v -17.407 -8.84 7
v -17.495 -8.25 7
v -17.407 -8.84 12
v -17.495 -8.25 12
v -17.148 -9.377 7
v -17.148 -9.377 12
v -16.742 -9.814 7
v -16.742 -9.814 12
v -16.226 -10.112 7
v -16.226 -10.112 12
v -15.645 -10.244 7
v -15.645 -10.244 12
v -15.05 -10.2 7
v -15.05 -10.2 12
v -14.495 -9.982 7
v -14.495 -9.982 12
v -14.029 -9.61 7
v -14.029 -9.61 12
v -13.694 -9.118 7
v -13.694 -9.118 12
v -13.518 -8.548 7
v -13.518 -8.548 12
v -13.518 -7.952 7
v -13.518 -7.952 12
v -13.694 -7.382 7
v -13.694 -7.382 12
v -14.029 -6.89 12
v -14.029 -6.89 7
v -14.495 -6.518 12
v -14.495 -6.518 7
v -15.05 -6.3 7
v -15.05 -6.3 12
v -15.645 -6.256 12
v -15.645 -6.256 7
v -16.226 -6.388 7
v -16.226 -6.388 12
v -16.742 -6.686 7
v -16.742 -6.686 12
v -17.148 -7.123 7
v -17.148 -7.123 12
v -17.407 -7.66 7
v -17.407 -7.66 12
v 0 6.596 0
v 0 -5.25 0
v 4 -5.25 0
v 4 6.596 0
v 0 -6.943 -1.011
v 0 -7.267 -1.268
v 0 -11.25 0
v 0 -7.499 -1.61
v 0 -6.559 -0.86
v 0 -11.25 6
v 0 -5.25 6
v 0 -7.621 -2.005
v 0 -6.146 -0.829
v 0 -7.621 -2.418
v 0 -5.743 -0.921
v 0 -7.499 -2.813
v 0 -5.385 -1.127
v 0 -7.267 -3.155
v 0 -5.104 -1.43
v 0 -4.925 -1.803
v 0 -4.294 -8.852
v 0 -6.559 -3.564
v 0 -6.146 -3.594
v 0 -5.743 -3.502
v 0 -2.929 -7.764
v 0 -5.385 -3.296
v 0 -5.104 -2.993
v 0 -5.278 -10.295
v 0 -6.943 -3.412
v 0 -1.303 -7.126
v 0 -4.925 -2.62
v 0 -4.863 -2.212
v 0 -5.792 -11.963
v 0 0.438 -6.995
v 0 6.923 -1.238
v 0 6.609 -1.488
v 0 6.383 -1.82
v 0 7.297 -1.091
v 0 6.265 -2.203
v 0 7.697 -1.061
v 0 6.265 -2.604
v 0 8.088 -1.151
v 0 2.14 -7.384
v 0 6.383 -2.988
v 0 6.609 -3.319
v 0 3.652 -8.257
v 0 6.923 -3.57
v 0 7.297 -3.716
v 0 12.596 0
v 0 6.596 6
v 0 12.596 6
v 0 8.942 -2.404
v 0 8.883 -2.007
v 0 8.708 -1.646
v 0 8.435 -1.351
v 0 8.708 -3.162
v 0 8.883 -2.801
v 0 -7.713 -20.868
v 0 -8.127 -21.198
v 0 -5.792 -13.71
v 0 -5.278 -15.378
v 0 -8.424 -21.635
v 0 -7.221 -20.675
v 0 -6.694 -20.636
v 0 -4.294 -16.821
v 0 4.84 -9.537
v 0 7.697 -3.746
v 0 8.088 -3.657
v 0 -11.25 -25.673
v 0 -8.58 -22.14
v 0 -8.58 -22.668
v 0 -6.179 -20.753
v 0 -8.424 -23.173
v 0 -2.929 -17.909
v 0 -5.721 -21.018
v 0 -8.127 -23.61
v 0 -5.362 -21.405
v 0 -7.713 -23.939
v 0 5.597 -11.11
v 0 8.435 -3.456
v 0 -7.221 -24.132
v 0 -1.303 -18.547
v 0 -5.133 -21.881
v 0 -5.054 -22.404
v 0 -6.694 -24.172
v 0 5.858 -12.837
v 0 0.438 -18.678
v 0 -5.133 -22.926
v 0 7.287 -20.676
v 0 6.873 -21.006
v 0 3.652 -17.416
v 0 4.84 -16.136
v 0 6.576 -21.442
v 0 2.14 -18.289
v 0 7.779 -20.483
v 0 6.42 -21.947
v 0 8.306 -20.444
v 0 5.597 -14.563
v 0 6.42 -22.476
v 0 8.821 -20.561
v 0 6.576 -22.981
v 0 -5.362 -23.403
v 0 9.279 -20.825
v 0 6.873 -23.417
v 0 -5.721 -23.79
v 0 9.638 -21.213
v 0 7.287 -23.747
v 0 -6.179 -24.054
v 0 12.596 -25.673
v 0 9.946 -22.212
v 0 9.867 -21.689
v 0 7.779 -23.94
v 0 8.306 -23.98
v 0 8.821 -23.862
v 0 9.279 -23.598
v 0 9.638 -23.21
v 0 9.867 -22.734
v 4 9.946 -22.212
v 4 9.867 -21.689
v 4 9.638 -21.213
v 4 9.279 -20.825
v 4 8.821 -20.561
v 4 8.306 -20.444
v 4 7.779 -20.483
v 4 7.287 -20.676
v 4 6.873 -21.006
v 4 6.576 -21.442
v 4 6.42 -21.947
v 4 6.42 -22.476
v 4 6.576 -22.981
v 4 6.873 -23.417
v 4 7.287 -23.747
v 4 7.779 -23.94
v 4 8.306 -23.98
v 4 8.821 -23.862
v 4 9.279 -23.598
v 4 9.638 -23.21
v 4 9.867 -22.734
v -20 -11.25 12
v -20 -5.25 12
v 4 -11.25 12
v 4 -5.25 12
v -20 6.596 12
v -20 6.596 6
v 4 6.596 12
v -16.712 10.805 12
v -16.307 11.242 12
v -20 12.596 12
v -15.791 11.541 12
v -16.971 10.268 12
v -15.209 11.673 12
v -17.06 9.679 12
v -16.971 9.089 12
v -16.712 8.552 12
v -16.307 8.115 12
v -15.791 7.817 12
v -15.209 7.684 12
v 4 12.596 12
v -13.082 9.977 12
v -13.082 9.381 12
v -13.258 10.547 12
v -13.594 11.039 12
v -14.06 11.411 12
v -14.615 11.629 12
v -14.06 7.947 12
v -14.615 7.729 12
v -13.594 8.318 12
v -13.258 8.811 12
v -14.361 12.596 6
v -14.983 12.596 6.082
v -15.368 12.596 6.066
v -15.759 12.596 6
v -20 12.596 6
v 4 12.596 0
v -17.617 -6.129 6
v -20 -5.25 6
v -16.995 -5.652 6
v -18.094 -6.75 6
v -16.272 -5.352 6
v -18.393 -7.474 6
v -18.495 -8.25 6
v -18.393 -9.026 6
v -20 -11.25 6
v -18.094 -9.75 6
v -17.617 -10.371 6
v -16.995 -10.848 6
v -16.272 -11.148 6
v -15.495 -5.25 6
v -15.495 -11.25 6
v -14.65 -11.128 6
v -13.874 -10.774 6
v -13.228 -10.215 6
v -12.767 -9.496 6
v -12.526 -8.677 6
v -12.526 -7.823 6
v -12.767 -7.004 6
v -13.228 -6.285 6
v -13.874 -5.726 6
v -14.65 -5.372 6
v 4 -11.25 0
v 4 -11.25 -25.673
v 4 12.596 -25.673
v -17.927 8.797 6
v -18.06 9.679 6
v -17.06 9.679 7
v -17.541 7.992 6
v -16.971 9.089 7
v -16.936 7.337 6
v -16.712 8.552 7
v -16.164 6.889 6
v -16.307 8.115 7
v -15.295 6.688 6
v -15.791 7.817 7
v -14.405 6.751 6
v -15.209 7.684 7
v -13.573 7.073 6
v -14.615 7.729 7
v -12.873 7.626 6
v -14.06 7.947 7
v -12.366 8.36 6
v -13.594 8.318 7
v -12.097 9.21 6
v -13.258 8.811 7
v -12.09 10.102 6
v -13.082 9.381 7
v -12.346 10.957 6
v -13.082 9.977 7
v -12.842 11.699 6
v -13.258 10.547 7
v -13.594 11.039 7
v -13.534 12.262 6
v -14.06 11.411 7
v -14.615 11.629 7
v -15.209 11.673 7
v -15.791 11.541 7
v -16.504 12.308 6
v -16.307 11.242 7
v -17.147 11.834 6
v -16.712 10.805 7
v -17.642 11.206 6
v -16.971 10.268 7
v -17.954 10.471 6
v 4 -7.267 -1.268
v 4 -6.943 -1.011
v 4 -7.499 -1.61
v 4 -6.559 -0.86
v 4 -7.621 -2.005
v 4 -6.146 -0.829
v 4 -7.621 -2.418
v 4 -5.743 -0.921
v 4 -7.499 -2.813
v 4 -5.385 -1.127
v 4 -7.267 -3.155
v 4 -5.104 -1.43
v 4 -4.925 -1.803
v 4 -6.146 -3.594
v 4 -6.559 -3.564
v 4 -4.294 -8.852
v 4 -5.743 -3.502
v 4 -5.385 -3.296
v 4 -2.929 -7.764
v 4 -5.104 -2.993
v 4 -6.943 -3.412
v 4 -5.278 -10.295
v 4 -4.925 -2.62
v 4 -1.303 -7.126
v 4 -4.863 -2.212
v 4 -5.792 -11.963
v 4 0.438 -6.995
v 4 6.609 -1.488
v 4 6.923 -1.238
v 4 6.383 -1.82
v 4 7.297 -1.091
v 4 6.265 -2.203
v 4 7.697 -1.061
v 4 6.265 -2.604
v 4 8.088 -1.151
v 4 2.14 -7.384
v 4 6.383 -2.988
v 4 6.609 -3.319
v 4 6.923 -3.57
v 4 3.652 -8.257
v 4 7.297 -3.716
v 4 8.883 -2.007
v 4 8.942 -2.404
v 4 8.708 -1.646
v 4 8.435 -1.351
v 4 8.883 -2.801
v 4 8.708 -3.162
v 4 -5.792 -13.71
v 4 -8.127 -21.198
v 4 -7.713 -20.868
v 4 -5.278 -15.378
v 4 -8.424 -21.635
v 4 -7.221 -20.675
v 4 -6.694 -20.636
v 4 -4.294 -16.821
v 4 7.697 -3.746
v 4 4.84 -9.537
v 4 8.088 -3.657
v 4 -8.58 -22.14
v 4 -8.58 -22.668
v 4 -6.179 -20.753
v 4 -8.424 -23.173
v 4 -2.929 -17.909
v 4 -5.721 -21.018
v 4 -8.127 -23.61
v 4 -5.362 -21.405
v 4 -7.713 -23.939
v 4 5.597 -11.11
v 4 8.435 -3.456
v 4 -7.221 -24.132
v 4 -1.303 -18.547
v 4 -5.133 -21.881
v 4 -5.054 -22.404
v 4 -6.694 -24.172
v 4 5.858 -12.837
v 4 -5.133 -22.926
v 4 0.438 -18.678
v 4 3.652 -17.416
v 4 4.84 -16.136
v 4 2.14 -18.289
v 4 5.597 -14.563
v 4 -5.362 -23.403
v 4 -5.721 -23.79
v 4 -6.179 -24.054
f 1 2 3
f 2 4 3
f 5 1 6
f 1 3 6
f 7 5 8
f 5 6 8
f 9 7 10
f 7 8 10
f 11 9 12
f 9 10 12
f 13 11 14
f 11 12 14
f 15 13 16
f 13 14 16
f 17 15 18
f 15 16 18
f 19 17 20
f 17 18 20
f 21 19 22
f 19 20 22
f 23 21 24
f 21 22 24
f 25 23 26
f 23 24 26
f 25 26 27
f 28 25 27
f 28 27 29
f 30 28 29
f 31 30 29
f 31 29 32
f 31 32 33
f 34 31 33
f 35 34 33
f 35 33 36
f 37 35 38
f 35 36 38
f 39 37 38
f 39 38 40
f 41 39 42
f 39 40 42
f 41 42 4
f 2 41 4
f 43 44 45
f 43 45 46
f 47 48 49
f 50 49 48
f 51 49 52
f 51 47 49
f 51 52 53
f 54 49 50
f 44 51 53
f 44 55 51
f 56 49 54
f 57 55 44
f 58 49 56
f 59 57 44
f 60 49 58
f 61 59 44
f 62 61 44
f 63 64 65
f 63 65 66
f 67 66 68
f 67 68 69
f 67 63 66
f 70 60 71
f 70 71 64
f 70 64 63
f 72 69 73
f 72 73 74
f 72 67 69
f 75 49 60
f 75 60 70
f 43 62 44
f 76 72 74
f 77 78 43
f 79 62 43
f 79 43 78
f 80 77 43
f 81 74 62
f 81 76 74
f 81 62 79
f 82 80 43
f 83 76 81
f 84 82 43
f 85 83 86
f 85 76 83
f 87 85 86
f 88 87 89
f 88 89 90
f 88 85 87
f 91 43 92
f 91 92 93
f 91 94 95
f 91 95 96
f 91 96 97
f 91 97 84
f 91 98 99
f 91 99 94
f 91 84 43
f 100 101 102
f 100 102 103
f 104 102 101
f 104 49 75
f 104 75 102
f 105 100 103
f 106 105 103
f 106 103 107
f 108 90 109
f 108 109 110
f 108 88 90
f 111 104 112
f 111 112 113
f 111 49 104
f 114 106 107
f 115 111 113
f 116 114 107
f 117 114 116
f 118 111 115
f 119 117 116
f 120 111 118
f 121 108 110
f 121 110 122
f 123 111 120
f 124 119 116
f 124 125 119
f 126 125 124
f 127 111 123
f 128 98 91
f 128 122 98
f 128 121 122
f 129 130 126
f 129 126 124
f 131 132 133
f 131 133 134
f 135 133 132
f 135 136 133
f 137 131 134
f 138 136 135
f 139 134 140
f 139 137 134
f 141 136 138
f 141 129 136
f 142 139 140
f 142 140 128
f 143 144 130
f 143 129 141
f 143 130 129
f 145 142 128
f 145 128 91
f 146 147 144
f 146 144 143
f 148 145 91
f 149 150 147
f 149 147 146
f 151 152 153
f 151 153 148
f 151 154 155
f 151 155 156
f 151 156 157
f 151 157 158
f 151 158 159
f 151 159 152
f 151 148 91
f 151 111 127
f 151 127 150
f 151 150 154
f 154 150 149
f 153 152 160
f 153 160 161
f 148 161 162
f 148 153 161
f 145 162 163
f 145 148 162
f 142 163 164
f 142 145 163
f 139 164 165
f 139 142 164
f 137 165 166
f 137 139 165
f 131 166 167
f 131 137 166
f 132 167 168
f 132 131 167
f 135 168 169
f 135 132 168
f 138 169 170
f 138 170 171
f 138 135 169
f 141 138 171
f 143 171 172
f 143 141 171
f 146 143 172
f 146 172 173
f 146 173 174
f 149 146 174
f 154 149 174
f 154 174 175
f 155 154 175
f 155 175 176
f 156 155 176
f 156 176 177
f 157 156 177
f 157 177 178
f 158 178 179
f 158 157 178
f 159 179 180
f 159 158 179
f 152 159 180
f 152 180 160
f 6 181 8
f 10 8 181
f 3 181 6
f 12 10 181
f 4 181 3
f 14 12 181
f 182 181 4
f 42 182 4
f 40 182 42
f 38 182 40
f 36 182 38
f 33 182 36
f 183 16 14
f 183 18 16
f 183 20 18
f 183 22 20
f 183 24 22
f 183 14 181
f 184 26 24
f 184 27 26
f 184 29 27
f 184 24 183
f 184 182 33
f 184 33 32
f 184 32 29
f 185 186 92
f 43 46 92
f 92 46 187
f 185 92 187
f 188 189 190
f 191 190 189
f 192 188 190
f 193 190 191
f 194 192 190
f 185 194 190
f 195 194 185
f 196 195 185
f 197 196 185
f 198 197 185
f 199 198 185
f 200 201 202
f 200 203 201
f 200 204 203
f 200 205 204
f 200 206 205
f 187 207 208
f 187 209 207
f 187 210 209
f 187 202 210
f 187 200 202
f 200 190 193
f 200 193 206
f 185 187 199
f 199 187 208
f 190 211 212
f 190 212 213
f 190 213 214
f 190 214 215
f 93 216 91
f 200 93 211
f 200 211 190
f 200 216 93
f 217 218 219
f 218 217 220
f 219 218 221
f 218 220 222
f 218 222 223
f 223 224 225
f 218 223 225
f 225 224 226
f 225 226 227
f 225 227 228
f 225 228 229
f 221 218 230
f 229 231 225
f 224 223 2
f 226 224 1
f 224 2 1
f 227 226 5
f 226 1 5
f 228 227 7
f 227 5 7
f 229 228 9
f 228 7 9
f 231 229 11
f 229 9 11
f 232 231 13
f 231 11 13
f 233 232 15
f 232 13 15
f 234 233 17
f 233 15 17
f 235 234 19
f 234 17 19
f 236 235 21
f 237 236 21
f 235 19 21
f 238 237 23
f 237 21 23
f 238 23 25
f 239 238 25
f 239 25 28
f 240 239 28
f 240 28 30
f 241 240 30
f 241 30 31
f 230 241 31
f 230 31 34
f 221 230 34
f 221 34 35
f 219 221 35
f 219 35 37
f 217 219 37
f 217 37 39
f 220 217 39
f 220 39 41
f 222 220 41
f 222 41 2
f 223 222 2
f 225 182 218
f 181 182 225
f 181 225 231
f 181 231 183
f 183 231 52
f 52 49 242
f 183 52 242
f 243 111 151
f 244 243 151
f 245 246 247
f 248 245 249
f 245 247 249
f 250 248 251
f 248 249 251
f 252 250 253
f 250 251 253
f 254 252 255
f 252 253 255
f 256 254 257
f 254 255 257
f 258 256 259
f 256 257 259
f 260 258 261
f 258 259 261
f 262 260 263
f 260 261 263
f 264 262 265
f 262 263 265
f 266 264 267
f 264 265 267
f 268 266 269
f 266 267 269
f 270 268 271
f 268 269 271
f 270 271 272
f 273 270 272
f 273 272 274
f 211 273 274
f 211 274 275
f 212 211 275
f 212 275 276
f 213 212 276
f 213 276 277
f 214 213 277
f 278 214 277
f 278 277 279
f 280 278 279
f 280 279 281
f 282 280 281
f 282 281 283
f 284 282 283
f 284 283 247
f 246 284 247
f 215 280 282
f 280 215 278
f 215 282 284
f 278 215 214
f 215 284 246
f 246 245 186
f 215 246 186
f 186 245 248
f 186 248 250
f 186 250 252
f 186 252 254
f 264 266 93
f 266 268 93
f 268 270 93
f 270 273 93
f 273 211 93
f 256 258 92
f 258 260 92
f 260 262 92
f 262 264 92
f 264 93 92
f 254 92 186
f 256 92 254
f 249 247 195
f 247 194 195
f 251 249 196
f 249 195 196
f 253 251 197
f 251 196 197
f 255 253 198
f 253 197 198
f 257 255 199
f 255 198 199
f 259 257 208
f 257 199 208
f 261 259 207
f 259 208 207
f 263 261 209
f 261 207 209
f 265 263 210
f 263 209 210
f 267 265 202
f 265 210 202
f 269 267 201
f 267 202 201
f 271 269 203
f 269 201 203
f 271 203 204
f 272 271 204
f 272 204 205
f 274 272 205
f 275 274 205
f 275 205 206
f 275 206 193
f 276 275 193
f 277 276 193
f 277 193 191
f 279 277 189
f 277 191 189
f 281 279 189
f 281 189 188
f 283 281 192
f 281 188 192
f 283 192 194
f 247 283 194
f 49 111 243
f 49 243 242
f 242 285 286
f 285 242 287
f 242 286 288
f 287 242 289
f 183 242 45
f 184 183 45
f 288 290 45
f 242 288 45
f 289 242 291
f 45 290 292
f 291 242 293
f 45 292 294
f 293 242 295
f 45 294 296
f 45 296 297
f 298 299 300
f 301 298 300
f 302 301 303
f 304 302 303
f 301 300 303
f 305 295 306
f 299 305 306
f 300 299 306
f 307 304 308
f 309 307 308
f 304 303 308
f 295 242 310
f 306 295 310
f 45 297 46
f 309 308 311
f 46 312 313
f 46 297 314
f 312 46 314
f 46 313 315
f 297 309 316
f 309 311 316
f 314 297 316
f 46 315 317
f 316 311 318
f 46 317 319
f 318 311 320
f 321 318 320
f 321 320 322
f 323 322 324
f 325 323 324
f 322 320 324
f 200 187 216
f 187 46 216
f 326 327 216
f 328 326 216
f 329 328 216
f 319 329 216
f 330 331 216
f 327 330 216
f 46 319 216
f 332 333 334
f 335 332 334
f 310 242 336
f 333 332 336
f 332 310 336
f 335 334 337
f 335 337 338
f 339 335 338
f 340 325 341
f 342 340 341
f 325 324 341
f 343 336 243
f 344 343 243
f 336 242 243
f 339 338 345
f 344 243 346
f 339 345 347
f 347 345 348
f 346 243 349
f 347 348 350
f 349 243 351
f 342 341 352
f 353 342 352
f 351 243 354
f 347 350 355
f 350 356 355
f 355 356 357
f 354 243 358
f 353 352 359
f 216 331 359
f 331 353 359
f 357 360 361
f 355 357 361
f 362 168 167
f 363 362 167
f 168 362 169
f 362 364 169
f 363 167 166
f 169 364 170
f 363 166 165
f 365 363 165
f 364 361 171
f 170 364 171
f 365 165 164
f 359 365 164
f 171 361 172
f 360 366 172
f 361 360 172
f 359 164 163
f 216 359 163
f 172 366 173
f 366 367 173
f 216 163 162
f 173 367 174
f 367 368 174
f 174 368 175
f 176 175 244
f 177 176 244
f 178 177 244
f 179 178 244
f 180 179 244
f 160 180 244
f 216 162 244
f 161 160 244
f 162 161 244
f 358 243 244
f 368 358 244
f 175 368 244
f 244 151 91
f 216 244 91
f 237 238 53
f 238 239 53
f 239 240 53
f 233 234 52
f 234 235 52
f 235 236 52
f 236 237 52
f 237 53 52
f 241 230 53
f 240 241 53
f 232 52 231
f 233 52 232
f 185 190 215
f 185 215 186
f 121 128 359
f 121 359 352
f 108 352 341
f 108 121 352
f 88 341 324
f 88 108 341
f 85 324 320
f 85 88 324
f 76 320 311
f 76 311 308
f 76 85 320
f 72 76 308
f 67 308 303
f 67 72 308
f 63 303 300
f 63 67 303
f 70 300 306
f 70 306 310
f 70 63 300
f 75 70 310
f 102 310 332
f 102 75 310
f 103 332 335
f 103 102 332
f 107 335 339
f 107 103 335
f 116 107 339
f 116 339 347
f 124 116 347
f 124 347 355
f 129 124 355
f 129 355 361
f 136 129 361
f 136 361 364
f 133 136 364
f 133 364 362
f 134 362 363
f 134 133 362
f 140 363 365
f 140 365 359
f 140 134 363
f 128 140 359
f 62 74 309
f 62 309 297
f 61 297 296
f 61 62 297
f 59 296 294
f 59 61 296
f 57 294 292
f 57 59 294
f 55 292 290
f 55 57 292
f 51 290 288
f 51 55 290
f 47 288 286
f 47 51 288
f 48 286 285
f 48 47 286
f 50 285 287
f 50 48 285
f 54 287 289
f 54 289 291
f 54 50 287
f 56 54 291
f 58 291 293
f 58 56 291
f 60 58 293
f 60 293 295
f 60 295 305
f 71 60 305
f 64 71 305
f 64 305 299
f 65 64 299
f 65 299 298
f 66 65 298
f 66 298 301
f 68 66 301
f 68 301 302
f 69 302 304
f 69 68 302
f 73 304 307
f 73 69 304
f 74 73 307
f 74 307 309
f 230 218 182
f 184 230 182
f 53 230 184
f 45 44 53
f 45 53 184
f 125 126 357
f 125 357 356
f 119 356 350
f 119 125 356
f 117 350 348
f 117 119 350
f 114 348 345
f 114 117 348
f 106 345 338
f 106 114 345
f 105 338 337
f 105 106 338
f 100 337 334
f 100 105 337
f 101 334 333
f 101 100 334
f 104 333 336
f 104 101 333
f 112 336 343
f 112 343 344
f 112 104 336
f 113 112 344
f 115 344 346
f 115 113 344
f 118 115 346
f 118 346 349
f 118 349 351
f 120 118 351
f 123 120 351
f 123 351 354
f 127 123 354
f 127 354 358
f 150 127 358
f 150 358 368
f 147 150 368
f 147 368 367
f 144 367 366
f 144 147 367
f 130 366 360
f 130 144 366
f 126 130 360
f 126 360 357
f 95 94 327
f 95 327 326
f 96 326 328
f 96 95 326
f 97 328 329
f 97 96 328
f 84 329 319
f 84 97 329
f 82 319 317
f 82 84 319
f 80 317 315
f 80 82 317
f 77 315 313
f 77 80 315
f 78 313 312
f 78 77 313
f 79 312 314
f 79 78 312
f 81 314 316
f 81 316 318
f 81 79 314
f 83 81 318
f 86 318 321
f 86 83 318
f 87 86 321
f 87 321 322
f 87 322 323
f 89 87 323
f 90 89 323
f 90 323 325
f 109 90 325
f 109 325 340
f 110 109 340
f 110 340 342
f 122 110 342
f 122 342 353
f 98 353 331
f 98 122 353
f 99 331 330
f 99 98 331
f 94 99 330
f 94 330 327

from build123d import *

# Parameters (mm, degrees)
F0_W           = 23.846153
F0_H           = 25.673076
F0_R           = 1.772989
F0_R_2         = 5.857696
F0_R_3         = 1.386751
F0_R_4         = 1.346154
F1_DEPTH       = 4
F2_W           = 4
F2_H           = 6
F3_DEPTH       = 10
F3_FACE_W      = 4
F3_FACE_H      = 6
F4_DEPTH       = 2
F5_W           = 6
F5_H           = 6
F6_DEPTH       = 20
F8_D           = 4
F8_CSINK_D     = 6
F8_CSINK_ANGLE = 90
F9_D           = 4
F9_CSINK_D     = 6
F9_CSINK_ANGLE = 90


with BuildPart() as f1:
    # F0 (on Right) → F1 (new body)
    with BuildSketch(Plane.YZ):
        with Locations((0.673076, -12.836538)):
            Rectangle(F0_W, F0_H)
        with Locations((-6.826923, -22.403846)):
            Circle(F0_R, mode=Mode.SUBTRACT)
        with Locations((8.173076, -22.211537)):
            Circle(F0_R, mode=Mode.SUBTRACT)
        with Locations((0, -12.836538)):
            Circle(F0_R_2, mode=Mode.SUBTRACT)
        with Locations((-6.25, -2.211538)):
            Circle(F0_R_3, mode=Mode.SUBTRACT)
        with Locations((7.596153, -2.403846)):
            Circle(F0_R_4, mode=Mode.SUBTRACT)
    extrude(amount=F1_DEPTH)

    # F2 (on face) → F3 (join)
    with BuildSketch(Plane.XY):
        with Locations((2, 9.596153)):
            Rectangle(F2_W, F2_H)
        with Locations((2, -8.25)):
            Rectangle(F2_W, F2_H)
    extrude(amount=F3_DEPTH)

    # F3_face (on face) → F4 (join)
    with BuildSketch(Plane(origin=(2, 9.596153, 10), x_dir=(1, 0, 0), z_dir=(0, 0, 1))):
        Rectangle(F3_FACE_W, F3_FACE_H)
        with Locations((0, -17.846153)):
            Rectangle(F3_FACE_W, F3_FACE_H)
    extrude(amount=F4_DEPTH)

    # F5 (on face) → F6 (join)
    with BuildSketch(Plane(origin=(0, 0, 0), x_dir=(0, -1, 0), z_dir=(-1, 0, 0))):
        with Locations((-9.596153, 9)):
            Rectangle(F5_W, F5_H)
        with Locations((8.25, 9)):
            Rectangle(F5_W, F5_H)
    extrude(amount=F6_DEPTH)

    # F8 (through all)
    with Locations(Plane(origin=(0, 0, 6), x_dir=(1, 0, 0), z_dir=(0, 0, -1))):
        with Locations((-15.495499, 8.25)):
            CounterSinkHole(F8_D / 2, F8_CSINK_D / 2, counter_sink_angle=F8_CSINK_ANGLE)

    # F9 (through all)
    with Locations(Plane(origin=(0, 0, 6), x_dir=(1, 0, 0), z_dir=(0, 0, -1))):
        with Locations((-15.059971, -9.678768)):
            CounterSinkHole(F9_D / 2, F9_CSINK_D / 2, counter_sink_angle=F9_CSINK_ANGLE)


solid = f1.part
